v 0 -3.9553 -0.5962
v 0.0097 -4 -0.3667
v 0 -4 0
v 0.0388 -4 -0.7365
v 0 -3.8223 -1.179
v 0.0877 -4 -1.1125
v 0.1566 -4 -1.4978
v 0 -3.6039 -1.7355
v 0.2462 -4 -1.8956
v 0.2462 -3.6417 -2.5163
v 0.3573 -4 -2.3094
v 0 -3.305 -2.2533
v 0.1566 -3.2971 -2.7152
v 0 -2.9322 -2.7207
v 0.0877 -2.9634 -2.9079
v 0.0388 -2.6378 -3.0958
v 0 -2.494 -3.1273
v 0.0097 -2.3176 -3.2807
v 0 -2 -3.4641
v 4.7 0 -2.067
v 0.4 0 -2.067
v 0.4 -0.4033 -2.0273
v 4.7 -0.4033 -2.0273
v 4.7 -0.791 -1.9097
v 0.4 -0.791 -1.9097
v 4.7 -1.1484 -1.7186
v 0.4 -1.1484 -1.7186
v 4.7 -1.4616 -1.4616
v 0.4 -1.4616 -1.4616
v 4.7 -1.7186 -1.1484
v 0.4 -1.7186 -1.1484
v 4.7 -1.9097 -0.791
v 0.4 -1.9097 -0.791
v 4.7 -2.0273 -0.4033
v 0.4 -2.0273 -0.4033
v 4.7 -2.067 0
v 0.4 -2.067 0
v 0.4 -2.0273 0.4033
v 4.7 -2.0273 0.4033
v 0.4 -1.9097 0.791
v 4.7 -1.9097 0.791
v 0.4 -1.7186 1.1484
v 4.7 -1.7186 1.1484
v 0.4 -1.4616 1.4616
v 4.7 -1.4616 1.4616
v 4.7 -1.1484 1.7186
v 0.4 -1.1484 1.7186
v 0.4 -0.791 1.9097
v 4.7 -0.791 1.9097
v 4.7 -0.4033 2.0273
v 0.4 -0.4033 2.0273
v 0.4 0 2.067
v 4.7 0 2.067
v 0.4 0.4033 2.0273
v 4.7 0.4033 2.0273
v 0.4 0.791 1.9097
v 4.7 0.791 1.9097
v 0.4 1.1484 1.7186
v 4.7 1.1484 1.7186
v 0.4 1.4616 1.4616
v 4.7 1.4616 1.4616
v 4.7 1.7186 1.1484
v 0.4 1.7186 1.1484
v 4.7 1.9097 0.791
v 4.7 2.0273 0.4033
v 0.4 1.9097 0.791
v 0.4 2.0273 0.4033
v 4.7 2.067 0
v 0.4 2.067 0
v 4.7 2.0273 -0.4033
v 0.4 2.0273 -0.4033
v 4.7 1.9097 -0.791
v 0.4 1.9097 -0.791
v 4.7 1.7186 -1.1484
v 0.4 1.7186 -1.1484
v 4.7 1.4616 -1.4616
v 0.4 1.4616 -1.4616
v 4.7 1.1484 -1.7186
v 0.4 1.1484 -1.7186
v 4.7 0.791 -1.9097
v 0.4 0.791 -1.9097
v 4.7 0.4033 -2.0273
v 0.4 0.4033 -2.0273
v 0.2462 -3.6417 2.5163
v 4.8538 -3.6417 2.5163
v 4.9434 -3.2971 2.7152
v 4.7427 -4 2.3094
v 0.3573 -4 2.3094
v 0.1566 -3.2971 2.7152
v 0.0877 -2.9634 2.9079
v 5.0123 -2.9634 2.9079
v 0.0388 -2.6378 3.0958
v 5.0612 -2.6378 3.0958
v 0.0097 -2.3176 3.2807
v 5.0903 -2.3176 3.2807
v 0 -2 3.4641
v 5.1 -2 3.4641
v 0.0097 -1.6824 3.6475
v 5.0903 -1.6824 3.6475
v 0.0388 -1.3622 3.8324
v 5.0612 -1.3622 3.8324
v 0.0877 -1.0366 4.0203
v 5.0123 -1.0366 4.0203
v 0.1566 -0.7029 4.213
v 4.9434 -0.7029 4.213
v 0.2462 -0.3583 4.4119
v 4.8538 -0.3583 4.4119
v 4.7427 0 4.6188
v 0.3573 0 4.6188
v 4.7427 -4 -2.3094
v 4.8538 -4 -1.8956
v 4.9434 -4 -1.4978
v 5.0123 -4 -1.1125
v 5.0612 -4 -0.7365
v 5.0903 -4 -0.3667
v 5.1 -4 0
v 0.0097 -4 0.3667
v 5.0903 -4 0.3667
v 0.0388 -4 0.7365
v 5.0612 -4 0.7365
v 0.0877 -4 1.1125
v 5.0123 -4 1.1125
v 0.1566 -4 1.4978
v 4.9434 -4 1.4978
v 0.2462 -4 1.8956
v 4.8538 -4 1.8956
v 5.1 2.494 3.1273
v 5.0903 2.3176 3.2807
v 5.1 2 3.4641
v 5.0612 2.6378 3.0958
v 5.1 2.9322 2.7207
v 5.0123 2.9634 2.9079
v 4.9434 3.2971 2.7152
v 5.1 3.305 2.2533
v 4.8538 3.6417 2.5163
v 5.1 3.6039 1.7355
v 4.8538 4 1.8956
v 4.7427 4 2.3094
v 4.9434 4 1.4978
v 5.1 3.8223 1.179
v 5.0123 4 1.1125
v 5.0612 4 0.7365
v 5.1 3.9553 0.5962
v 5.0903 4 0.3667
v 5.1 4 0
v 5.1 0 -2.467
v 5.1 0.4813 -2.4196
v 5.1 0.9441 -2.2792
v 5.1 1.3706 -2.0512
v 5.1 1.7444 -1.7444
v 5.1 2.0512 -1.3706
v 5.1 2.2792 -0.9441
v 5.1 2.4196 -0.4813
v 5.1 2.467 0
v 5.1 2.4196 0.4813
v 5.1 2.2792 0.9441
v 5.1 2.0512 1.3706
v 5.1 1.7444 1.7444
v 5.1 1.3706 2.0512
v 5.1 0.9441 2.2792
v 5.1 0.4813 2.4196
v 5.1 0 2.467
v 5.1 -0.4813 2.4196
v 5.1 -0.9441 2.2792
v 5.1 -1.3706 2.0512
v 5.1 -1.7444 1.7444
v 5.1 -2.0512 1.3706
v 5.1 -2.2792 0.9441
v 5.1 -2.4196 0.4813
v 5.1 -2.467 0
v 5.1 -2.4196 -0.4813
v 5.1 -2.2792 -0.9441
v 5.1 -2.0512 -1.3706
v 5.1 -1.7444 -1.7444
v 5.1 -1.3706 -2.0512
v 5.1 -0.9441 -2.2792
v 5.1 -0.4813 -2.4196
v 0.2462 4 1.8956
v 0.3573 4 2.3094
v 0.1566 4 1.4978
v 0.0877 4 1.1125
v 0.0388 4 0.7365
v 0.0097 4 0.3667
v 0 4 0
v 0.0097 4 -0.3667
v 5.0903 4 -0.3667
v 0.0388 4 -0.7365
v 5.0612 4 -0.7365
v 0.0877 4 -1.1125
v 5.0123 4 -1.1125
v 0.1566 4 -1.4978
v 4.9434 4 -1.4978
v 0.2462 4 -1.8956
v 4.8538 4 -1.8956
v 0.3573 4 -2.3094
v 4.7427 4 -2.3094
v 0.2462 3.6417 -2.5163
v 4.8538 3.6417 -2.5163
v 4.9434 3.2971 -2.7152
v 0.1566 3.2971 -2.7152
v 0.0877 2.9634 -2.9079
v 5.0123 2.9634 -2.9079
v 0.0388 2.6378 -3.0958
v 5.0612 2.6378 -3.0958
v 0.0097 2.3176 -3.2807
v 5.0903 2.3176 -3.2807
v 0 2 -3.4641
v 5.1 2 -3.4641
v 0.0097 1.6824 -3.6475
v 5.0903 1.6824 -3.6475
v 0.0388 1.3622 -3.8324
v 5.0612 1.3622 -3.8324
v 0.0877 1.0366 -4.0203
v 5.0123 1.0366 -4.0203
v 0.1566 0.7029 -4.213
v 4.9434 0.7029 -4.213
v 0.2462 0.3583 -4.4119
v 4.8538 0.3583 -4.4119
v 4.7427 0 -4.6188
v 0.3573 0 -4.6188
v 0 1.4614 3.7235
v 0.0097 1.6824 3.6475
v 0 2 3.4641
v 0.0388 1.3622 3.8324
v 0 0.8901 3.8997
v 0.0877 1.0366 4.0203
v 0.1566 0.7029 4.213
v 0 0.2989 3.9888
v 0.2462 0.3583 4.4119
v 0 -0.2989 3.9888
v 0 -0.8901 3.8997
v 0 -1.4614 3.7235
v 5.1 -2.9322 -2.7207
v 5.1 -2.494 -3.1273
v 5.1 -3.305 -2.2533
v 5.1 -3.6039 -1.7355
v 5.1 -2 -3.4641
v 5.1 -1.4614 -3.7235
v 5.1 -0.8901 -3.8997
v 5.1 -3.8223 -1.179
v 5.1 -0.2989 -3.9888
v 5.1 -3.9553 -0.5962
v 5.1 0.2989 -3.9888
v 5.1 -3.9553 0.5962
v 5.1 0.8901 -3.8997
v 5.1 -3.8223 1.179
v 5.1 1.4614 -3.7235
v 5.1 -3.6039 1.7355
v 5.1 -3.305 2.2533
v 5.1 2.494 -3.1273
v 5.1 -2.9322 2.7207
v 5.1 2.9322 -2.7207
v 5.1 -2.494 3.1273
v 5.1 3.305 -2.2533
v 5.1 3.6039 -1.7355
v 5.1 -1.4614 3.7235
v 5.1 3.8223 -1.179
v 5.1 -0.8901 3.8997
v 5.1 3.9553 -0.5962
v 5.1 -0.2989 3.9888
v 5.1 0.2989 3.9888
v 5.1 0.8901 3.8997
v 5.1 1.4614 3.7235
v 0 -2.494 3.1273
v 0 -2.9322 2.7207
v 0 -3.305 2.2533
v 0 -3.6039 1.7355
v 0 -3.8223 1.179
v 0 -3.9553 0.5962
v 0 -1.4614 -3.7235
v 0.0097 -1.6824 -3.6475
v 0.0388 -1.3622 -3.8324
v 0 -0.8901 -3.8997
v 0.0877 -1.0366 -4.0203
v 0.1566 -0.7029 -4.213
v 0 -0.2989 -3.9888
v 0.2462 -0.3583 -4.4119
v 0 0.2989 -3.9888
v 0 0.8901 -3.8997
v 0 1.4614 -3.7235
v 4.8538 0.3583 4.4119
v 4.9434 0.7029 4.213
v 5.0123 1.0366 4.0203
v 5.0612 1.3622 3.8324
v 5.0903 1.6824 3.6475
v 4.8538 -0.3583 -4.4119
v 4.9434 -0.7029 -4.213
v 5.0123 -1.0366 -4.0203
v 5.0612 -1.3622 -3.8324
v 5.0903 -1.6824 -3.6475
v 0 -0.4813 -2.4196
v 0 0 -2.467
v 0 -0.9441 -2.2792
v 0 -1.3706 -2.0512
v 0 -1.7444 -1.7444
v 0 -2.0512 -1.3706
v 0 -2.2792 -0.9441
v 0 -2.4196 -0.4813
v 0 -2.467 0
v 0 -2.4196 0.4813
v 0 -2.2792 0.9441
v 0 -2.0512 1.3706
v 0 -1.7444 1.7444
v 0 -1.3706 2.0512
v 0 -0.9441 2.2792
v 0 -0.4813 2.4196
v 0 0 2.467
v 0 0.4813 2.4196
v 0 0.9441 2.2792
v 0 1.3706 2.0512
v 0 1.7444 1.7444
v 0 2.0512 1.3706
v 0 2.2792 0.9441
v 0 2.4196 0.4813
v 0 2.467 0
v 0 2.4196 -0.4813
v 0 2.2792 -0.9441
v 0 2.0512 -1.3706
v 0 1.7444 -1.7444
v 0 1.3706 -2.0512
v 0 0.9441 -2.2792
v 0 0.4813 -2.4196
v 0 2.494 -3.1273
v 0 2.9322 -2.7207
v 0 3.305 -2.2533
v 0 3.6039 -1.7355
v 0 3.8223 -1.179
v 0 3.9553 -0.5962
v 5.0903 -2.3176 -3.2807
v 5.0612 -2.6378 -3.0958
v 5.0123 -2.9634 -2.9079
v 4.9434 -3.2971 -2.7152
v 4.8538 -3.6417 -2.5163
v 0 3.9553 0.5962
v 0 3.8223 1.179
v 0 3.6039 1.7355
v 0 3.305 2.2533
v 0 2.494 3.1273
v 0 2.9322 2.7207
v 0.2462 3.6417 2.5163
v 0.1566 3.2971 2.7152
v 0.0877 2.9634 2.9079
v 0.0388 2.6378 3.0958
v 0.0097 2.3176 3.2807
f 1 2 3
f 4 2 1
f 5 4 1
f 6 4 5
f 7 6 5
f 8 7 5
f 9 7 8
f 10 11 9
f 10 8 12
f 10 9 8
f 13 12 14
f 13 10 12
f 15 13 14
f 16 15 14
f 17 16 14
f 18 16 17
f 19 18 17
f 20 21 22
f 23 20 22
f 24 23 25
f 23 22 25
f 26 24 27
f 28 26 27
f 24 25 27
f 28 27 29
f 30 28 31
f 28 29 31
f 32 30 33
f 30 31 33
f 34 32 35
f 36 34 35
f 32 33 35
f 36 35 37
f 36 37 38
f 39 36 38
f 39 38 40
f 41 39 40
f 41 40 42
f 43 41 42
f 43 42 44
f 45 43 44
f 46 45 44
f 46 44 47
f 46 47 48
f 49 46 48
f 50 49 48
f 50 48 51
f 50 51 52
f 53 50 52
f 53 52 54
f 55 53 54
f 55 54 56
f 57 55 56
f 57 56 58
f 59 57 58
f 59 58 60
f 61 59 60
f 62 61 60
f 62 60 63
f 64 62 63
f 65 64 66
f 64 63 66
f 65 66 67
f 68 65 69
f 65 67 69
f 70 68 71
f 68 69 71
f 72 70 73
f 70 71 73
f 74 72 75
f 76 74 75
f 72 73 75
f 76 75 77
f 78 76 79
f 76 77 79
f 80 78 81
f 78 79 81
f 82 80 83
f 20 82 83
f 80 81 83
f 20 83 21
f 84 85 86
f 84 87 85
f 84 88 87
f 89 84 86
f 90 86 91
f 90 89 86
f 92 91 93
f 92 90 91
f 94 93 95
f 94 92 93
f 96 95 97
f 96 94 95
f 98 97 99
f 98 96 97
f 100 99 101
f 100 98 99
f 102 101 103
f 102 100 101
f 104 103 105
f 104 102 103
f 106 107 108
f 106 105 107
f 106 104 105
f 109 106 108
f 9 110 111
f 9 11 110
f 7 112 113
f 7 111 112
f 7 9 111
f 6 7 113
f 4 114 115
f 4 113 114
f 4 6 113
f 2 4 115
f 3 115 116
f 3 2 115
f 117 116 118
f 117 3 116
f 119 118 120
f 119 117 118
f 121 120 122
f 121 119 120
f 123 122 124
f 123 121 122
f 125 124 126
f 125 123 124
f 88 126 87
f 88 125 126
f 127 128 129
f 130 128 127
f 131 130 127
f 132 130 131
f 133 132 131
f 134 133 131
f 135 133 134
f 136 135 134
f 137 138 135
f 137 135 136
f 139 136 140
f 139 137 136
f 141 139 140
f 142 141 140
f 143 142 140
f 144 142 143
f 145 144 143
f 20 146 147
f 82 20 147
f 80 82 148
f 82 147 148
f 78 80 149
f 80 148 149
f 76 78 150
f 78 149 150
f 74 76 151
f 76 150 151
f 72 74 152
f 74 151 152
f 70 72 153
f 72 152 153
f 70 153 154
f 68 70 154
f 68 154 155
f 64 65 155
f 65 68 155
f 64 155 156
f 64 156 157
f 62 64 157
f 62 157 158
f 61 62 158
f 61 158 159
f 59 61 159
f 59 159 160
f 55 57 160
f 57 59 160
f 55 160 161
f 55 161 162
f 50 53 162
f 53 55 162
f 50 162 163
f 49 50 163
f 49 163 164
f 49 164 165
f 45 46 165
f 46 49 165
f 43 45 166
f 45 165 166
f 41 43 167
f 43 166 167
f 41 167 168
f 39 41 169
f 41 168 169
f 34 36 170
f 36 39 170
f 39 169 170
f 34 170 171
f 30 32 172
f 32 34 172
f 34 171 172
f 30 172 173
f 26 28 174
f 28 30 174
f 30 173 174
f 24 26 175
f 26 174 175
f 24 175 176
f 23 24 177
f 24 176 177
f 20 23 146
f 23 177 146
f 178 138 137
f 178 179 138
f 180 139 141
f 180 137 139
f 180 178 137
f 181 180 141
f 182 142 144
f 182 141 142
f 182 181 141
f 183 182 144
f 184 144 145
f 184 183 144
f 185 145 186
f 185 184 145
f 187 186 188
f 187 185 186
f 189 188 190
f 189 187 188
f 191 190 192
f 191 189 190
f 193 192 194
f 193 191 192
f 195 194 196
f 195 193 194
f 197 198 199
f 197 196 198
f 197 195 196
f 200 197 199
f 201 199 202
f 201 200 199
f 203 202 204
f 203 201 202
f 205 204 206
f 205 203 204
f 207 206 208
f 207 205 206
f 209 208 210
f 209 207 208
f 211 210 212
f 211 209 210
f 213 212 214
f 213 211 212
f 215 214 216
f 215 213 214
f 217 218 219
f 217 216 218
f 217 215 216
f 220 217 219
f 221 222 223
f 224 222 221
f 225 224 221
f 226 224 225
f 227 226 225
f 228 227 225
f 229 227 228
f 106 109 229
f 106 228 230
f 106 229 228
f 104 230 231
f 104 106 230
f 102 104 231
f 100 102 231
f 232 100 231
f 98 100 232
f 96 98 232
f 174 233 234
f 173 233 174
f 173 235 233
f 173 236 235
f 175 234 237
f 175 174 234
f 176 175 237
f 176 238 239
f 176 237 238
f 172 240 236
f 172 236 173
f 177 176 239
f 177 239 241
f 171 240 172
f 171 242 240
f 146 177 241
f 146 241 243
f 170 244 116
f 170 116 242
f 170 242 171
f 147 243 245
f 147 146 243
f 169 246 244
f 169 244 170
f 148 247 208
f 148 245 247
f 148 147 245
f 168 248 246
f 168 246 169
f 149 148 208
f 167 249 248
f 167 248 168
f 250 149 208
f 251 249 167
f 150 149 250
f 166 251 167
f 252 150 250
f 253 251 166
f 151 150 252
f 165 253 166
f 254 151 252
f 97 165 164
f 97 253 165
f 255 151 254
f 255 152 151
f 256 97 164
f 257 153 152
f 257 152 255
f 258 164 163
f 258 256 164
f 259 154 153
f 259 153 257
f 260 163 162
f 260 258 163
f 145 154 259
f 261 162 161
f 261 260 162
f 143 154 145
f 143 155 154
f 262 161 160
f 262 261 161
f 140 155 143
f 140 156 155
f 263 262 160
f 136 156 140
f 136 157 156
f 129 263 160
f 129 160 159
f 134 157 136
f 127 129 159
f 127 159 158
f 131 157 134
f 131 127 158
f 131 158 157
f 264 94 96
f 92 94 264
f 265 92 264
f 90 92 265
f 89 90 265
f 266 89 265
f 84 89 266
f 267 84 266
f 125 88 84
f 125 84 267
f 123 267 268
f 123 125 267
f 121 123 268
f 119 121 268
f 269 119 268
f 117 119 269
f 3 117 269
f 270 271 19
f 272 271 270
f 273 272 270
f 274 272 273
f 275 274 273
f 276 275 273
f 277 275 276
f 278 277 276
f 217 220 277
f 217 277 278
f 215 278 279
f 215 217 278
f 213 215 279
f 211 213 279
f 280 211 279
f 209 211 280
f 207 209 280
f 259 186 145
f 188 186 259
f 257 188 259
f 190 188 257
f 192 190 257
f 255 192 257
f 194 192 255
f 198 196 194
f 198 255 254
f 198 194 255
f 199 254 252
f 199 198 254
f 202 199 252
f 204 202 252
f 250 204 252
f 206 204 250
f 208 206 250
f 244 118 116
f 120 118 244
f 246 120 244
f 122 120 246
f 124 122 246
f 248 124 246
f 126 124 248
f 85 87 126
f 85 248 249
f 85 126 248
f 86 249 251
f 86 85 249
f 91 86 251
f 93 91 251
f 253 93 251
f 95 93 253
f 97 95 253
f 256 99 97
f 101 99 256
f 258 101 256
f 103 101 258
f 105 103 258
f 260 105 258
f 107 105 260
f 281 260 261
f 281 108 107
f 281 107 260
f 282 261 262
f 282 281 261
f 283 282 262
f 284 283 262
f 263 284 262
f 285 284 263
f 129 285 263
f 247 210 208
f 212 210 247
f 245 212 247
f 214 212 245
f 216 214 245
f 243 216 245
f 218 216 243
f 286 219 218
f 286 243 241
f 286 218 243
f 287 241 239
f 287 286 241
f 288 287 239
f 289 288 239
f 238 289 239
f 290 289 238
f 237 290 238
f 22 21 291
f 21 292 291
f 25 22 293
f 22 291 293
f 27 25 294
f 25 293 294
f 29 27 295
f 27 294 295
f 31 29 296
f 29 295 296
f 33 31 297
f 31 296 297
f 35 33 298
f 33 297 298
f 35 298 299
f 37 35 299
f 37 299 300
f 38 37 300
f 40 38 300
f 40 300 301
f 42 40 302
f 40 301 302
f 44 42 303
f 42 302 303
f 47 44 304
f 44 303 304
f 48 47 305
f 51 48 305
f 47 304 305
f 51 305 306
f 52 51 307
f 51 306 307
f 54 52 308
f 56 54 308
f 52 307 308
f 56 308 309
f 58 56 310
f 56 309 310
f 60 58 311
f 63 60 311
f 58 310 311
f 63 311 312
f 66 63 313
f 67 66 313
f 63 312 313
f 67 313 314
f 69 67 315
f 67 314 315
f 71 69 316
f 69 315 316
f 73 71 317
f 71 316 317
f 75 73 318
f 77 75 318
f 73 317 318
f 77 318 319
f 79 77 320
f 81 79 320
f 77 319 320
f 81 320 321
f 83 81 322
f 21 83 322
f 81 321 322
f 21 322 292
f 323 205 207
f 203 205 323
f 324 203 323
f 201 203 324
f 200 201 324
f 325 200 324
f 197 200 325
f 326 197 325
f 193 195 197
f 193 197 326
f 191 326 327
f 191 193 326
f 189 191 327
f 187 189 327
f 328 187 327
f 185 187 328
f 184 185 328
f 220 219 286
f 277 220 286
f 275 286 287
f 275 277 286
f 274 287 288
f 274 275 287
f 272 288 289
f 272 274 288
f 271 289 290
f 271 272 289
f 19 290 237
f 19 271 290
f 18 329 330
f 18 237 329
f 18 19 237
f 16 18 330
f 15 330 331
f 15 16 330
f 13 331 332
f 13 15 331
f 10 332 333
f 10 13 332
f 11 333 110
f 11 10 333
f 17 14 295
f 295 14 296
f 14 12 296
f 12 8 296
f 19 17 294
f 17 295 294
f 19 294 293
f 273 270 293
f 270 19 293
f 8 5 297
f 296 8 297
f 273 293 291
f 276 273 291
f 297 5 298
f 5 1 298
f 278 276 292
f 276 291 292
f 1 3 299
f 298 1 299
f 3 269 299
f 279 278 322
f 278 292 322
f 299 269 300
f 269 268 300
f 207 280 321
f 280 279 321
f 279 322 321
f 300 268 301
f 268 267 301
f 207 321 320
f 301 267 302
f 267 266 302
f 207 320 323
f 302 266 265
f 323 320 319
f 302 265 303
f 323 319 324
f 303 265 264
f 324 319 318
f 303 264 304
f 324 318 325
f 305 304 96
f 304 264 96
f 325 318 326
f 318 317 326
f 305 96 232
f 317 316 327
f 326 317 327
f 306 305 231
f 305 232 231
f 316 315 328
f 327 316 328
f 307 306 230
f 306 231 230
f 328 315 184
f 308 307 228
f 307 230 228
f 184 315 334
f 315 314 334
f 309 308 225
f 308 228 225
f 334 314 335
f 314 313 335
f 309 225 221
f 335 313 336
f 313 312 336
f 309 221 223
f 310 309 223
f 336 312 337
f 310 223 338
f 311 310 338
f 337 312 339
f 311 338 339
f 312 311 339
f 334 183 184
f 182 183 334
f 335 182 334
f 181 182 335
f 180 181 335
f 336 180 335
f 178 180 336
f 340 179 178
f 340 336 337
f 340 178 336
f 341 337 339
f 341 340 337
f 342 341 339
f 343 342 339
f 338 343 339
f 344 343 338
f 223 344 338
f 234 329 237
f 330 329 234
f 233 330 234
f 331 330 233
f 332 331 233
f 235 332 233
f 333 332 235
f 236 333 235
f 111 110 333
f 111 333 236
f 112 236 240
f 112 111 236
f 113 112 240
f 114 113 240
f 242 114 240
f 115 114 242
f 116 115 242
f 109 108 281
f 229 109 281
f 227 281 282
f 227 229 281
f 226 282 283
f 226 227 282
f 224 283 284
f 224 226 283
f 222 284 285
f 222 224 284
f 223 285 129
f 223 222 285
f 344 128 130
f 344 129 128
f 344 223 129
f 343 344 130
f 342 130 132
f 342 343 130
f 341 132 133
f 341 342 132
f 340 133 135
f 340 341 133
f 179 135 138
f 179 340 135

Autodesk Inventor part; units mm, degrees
sketch "Sketch1" plane through (0, 0, 0) normal (1, 0, 0) x (0, 1, 0)
  line L0 (4, 2.3094) -> (4, -2.3094)
  line L1 (4, -2.3094) -> (0, -4.6188)
  line L2 (0, -4.6188) -> (-4, -2.3094)
  line L3 (-4, -2.3094) -> (-4, 2.3094)
  line L4 (-4, 2.3094) -> (0, 4.6188)
  line L5 (0, 4.6188) -> (4, 2.3094)
  circle A0 centre (0, 0) radius 4 construction
  dimension "d0" = 8
extrude "Extrusion1" add sketch "Sketch1" along normal blind 5.1
sketch "Sketch2" plane through (5.1, 0, 0) normal (1, 0, 0) x (0, 1, 0)
  line L0 (-4, 2.3094) -> (0, 4.6188) projected
  line L1 (0, -4.6188) -> (-4, -2.3094) projected
  line L2 (-4, 2.3094) -> (4, -2.3094) construction
  line L3 (-4, -2.3094) -> (4, 2.3094) construction
  point P0 (0, 0)
hole "Hole1" at (5.1, 0, 0) direction (-1, 0, 0) diameter 4.134 end through all thread size "M5x0.8" class "6H" standard "ISO Metric profile"
chamfer "Chamfer1" distance 0.4 angle 45 2 edges at (5.1, 0, 2.067) (0, 0, 2.067)
sketch "Sketch3" plane through (0, 0, 0) normal (0, 1, 0) x (-1, 0, 0)
  line L0 (-7.0172, 0) -> (2.1698, 0) projected
  line L1 (-5.7048, 0) -> (0.8574, 0)
  line L2 (-5.1, 0) -> (-5.1, -4.6188)
  line L3 (-5.1, -4.6188) -> (0, -4.6188)
  line L4 (0, -4.6188) -> (0, 0)
  line L5 (-5.1, -2.3094) -> (-5.1, -4.6188) projected
  line L6 (0, -2.3094) -> (0, -4.6188) projected
  line L7 (0, -4.6188) -> (-5.1, -4.6188) projected
  line L8 (-5.1, -4) -> (-4.7427, -4.6188)
  line L9 (-5.1, -4.6188) -> (-5.1, -4)
  line L10 (-5.1, -4.6188) -> (-4.7427, -4.6188)
  line L11 (0, -4) -> (-0.3573, -4.6188)
  line L12 (-0.3573, -4.6188) -> (0, -4.6188)
  line L13 (0, -4.6188) -> (0, -4)
  dimension "d32" = 4
  dimension "d33" = 30
revolve "Revolution1" cut sketch "Sketch3" angle 360 about axis through (0, 0, 0) along (-1, 0, 0) contours L8 L3 L2 | L4 L3 L11
ref_plane "MSC_PT1" through (5.1, 0, 0) normal (1, 0, 0) x (0, 1, 0)
ref_plane "MSC_PT2" through (0, 0, 0) normal (-1, 0, 0) x (0, -1, 0)
ref_plane "MSC_PF1" through (0, 0, 0) normal (1, 0, 0) x (0, 1, 0)
equation "\"d0\" = Smax"
equation "\"d1\" = Mmax"
equation "\"d10\" = 0.5 * PTC"
equation "\"d32\" = 0.5 * Smax"
equation "\"NND\" = 5"
equation "\"Smax\" = 8"
equation "\"Mmax\" = 5.1"
equation "\"PTC\" = 0.8"
equation "\"THREADDIA\" = NND"
equation "\"TEMPLATE\" = 1.2345"
properties part number "ANSI B18.2.4.2M - M5x0.8" material "Steel, Mild"
